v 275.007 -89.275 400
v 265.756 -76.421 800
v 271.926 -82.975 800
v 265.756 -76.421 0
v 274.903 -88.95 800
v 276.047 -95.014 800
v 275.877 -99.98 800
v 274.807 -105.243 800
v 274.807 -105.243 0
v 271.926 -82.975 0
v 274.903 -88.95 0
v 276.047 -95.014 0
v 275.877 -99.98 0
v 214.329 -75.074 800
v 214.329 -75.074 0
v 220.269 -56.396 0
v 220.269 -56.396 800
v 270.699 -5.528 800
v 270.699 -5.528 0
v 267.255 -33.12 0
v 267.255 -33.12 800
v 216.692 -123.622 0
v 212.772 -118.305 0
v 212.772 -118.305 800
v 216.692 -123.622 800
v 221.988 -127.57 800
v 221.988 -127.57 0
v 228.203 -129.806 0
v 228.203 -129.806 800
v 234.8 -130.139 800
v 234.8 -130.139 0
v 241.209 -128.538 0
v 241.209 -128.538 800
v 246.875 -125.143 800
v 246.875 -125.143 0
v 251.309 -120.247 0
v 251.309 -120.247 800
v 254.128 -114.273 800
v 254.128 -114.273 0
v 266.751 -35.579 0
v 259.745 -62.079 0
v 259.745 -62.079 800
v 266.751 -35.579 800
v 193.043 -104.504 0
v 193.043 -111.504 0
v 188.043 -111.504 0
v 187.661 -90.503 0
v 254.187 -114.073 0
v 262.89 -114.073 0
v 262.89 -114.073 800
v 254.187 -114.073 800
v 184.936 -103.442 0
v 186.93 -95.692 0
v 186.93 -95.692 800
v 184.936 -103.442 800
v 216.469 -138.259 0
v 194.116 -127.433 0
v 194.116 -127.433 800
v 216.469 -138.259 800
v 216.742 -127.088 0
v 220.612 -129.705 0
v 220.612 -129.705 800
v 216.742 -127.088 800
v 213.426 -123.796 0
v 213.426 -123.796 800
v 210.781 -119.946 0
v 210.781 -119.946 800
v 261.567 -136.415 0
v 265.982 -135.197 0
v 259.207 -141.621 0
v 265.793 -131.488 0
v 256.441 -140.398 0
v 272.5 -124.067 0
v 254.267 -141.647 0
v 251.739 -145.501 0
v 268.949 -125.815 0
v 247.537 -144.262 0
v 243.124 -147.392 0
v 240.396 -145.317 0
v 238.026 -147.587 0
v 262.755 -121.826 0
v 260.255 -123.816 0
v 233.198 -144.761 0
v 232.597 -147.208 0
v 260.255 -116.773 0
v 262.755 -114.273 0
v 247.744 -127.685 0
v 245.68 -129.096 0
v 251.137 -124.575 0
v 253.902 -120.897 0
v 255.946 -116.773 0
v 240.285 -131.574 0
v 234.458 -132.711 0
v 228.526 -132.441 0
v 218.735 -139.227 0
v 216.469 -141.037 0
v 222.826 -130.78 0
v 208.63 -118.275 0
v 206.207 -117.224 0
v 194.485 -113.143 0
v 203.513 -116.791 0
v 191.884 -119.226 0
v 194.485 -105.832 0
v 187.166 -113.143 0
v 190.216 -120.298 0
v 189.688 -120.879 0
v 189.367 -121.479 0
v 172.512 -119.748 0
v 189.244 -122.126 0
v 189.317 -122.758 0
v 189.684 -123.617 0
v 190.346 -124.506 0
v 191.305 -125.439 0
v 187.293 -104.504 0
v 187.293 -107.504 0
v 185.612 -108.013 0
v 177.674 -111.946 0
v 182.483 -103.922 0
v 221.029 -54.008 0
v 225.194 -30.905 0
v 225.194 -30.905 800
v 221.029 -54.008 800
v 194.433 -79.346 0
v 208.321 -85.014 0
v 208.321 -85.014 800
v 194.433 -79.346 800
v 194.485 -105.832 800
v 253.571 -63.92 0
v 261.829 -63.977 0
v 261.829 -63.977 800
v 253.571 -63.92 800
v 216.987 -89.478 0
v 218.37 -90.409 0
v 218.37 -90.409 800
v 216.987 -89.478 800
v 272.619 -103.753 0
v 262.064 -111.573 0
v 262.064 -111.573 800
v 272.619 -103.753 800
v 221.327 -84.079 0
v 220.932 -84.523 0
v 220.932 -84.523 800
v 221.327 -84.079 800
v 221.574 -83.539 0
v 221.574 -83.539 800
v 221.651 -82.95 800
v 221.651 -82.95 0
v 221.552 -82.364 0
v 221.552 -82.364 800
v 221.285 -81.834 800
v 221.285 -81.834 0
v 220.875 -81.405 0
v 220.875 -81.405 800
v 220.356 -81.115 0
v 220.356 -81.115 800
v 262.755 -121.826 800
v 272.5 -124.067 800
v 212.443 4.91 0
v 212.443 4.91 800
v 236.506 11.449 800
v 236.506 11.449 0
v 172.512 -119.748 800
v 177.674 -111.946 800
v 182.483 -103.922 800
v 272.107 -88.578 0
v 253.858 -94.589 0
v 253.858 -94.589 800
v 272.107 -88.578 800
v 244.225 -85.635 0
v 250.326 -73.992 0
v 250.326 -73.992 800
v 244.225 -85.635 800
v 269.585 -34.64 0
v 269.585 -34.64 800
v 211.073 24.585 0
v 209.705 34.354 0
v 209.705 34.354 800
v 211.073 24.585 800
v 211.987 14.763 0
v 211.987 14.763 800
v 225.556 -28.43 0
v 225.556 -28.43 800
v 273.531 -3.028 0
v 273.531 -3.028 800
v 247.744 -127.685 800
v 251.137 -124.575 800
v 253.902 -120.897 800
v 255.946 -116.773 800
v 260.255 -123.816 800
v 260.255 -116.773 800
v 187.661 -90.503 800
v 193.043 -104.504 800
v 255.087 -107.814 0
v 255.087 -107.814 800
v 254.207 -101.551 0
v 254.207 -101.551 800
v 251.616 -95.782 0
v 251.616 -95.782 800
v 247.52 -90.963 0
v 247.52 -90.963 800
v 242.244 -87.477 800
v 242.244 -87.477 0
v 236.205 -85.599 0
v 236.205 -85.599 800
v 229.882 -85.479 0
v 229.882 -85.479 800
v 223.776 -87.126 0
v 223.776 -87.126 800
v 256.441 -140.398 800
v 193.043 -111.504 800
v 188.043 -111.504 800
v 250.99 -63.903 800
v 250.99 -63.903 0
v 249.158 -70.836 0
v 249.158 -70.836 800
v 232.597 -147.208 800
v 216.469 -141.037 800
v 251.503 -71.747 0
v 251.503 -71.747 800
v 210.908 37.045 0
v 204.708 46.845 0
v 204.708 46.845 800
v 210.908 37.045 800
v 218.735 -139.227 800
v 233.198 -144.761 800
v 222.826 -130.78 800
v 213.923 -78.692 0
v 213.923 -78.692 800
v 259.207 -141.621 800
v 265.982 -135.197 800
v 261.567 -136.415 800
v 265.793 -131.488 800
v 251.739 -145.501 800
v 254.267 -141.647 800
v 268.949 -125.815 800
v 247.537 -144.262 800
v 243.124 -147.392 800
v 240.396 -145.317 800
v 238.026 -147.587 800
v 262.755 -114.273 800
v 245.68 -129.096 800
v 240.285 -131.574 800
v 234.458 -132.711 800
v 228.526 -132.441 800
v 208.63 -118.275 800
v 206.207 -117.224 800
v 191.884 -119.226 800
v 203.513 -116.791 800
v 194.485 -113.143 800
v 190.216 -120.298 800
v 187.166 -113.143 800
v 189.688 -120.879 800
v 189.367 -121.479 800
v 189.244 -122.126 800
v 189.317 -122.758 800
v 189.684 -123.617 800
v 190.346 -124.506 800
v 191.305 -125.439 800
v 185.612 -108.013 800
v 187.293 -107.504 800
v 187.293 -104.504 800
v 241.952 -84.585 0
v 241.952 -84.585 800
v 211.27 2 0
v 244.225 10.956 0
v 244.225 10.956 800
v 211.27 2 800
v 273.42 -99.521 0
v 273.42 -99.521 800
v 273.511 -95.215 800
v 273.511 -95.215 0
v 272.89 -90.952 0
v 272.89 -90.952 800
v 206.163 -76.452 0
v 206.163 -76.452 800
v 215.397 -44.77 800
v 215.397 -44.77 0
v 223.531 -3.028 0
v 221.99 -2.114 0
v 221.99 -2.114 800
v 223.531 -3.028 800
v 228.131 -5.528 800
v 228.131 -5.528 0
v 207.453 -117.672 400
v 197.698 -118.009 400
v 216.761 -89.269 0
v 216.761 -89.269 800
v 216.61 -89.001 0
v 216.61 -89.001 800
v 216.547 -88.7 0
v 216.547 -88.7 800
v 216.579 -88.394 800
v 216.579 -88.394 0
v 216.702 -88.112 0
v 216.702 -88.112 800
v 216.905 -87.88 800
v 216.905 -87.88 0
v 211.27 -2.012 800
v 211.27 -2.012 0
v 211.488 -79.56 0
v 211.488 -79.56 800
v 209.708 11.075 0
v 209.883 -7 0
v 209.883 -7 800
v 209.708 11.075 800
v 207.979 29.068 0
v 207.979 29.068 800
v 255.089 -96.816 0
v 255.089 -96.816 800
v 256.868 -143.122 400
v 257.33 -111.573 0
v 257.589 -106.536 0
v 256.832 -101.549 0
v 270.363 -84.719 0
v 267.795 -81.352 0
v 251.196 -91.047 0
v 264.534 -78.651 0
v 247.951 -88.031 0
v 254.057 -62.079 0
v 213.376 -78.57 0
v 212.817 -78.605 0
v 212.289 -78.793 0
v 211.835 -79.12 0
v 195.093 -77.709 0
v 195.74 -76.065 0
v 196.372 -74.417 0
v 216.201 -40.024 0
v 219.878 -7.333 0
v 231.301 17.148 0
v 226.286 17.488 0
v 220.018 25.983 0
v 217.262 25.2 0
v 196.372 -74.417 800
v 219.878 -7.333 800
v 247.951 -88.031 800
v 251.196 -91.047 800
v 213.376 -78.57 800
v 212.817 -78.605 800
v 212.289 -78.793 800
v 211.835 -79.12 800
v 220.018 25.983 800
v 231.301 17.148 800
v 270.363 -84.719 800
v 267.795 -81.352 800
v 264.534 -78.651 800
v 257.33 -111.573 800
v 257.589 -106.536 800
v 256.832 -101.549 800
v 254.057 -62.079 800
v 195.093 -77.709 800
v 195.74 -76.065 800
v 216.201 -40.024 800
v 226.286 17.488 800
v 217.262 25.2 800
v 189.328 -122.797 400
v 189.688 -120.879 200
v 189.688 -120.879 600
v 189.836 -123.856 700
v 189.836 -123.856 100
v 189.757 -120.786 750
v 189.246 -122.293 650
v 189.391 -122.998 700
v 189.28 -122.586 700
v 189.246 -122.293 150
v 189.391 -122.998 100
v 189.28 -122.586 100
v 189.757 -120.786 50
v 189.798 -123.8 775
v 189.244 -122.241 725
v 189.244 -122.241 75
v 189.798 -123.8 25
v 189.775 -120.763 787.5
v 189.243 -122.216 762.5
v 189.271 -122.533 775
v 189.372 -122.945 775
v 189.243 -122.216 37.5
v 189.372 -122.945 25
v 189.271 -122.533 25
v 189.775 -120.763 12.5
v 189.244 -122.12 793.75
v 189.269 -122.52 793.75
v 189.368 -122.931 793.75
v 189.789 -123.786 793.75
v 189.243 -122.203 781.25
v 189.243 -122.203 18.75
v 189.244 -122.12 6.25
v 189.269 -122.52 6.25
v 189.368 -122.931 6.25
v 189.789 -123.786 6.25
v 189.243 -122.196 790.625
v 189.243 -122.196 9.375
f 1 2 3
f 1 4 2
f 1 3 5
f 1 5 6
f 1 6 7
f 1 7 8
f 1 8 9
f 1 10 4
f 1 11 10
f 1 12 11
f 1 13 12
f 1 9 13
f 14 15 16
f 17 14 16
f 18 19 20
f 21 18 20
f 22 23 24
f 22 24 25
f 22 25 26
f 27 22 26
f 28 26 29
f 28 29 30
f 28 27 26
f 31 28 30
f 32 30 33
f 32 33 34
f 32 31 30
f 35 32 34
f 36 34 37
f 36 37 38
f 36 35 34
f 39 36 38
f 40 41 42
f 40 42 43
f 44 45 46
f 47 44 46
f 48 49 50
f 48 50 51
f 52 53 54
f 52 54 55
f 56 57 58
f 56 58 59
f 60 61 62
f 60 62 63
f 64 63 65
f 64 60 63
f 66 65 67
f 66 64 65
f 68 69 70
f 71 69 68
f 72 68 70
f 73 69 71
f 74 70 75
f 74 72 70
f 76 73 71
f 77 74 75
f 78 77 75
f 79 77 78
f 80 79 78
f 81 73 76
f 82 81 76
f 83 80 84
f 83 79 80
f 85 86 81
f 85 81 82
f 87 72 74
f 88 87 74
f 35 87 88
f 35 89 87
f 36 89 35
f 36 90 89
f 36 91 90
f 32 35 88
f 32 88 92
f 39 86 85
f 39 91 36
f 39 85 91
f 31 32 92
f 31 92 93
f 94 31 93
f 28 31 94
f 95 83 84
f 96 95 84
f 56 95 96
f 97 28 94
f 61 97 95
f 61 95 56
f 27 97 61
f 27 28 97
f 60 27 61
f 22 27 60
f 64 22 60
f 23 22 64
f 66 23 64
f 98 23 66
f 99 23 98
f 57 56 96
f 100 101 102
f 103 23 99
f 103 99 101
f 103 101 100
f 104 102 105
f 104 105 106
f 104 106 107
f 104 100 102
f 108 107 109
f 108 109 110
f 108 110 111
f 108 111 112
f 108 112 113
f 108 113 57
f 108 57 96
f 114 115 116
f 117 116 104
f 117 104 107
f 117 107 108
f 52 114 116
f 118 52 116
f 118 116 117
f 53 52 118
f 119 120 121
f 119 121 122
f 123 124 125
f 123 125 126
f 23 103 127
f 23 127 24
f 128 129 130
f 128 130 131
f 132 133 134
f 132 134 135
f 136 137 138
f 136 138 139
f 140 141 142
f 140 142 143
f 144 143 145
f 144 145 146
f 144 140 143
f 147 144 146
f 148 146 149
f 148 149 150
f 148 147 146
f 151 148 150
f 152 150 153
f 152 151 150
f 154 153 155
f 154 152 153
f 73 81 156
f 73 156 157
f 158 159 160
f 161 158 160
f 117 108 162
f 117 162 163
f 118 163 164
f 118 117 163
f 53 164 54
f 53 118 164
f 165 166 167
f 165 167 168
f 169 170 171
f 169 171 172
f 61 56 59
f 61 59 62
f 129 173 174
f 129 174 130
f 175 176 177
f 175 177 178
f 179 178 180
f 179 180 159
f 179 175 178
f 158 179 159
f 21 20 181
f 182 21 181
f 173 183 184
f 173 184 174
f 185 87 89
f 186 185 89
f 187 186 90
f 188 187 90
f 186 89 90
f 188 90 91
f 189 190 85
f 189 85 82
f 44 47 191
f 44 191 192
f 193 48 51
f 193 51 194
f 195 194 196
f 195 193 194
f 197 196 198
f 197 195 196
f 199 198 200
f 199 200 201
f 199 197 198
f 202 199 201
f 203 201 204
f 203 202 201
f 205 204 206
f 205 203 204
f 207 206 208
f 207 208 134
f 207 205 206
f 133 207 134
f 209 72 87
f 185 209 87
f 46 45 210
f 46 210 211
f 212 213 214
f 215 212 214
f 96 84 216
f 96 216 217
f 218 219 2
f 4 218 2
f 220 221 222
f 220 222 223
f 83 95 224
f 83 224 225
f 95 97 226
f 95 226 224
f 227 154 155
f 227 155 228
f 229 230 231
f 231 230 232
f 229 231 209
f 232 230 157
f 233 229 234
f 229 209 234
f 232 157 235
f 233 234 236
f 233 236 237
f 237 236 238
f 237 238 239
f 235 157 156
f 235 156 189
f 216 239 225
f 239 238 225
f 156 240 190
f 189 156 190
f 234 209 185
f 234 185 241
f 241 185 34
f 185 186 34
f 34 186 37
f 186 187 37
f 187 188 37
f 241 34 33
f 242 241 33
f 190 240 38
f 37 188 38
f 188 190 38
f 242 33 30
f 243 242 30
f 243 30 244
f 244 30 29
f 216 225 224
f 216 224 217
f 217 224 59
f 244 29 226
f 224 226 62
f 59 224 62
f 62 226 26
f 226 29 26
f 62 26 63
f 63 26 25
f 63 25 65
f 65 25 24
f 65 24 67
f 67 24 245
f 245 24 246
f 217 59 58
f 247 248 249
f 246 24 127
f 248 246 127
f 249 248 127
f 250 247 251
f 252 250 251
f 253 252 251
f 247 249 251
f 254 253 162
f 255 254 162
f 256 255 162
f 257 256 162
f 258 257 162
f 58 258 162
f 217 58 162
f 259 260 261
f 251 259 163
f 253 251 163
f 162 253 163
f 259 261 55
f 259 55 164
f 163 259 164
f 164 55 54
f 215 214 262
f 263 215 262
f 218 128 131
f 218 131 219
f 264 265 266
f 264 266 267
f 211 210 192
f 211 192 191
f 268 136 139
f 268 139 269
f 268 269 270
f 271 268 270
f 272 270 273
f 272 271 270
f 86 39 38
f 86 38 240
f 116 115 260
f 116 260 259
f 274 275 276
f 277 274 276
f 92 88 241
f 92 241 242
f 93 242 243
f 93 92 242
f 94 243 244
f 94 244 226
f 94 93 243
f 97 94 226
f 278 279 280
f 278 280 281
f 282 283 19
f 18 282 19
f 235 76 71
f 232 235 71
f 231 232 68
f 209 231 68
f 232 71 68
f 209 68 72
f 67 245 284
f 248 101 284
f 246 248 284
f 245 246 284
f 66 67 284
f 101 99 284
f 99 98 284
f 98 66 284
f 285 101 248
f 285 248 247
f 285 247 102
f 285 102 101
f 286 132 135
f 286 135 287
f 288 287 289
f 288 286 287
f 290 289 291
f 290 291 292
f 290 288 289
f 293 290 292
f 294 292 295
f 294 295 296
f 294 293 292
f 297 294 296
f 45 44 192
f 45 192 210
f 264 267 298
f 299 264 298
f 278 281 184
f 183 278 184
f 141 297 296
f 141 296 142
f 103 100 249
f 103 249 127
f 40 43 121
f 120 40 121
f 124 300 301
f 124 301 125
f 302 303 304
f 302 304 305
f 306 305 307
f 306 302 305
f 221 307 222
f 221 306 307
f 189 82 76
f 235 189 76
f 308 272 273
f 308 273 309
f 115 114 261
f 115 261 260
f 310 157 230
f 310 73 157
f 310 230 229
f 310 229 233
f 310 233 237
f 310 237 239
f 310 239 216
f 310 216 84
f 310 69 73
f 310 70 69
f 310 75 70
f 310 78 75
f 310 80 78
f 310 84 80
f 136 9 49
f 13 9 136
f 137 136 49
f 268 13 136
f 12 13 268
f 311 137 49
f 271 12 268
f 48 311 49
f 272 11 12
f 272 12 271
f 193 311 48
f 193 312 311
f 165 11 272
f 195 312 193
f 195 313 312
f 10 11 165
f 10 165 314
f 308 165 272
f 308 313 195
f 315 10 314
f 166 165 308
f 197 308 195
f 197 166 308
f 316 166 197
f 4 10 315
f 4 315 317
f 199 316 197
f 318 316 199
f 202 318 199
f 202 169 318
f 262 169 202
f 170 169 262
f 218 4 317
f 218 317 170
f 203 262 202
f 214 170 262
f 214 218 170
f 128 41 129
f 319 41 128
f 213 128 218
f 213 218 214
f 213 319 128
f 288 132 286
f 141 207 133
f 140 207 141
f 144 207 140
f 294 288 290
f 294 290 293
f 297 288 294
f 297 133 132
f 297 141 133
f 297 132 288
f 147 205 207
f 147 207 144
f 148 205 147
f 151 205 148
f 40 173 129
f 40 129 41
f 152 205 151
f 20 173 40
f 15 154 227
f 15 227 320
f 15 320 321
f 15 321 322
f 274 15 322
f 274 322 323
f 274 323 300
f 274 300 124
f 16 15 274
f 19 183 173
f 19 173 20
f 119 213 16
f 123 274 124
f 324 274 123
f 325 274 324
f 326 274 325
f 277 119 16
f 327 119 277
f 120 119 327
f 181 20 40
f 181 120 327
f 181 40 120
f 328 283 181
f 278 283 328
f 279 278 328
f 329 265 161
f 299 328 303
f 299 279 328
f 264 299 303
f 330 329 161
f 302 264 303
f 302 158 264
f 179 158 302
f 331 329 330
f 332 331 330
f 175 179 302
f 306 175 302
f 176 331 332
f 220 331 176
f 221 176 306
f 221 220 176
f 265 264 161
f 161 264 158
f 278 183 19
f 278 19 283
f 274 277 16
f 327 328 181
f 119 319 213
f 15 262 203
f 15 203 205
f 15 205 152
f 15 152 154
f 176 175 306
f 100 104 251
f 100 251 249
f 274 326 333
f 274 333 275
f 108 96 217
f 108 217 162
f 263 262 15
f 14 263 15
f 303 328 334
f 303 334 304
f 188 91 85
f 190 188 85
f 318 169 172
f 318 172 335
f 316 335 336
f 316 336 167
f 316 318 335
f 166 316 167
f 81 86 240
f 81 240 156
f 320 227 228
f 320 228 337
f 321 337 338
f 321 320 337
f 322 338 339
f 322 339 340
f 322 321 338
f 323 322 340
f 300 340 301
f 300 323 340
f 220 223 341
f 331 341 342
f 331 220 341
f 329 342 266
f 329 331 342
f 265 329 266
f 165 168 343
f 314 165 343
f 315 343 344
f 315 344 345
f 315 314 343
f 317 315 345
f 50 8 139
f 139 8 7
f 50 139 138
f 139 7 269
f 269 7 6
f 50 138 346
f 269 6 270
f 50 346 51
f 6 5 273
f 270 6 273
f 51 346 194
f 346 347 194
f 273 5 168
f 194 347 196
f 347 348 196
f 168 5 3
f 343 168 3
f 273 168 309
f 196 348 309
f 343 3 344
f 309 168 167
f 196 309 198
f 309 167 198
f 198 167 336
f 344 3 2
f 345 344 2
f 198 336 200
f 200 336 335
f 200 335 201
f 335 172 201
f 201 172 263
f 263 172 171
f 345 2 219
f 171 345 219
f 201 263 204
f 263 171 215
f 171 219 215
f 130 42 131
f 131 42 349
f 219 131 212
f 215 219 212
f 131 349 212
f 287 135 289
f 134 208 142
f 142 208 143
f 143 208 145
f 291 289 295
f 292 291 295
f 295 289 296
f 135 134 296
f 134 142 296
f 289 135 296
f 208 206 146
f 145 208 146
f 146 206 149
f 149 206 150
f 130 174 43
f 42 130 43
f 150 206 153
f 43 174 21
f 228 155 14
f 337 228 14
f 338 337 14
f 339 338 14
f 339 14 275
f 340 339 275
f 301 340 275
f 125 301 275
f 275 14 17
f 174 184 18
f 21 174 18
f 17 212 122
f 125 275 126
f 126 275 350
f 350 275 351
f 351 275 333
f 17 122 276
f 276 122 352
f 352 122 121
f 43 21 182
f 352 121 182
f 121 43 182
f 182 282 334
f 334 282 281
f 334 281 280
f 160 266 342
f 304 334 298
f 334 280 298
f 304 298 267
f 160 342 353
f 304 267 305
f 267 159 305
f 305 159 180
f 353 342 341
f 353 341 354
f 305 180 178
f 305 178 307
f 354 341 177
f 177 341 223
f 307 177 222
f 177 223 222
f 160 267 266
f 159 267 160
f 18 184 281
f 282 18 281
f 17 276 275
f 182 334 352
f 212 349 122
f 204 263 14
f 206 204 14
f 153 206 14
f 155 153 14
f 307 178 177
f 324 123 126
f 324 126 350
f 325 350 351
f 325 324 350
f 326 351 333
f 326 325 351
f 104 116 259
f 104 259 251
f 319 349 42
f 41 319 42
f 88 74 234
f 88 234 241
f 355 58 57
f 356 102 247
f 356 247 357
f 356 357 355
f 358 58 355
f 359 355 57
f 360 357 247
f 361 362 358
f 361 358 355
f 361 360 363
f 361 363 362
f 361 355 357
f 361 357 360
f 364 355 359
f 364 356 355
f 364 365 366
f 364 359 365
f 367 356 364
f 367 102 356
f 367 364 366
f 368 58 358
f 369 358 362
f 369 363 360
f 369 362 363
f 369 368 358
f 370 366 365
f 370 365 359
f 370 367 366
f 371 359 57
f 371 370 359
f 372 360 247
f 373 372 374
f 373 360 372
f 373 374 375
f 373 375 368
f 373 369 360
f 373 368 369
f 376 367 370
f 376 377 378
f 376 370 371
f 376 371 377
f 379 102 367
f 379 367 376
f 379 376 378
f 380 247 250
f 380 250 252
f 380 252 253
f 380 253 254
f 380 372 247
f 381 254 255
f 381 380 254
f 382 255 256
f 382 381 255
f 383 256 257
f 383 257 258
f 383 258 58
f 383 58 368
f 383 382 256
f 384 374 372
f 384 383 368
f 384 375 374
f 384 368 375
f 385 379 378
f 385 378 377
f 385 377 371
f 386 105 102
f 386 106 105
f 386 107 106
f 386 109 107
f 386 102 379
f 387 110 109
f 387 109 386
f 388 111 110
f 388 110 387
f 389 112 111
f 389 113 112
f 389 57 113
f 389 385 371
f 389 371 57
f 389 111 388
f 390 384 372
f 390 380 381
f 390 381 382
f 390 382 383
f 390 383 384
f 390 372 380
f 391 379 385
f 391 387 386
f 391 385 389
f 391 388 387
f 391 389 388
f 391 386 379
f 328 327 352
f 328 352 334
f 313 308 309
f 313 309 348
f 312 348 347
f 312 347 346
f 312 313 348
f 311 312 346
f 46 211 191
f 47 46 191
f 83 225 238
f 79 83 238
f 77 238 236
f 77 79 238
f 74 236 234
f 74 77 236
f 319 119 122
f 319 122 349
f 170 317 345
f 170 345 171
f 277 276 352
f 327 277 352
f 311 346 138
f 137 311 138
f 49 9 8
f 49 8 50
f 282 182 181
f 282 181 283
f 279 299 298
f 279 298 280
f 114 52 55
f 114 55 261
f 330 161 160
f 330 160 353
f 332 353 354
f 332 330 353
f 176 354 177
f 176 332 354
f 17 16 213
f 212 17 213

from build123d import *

# Parameters (mm, degrees)
BOSS_EXTRUDE1_DEPTH   = 800
BOSS_EXTRUDE1_2_DEPTH = 800
BOSS_EXTRUDE1_3_DEPTH = 800


with BuildPart() as part:
    # Sketch2 → Boss-Extrude1 (new body)
    with BuildSketch(Plane.XY):
        with BuildLine():
            Line((219.877743808, -7.333333333), (209.883300908, -7))
            ThreePointArc((209.883300908, -7), (209.036823939, 20.089953644), (204.708380722, 46.845265098))
            Line((204.708380722, 46.845265098), (210.908263166, 37.044972147))
            ThreePointArc((210.908263166, 37.044972147), (225.418988897, 21.257964998), (244.224799112, 10.95591384))
            Line((244.224799112, 10.95591384), (211.269993414, 2))
            Line((211.269993414, 2), (211.269993414, -2.012186433))
            Line((211.269993414, -2.012186433), (221.990475975, -2.114290898))
            Line((221.990475975, -2.114290898), (223.530977705, -3.027795155))
            Line((223.530977705, -3.027795155), (273.530977705, -3.027795155))
            Line((273.530977705, -3.027795155), (269.584815864, -34.639562765))
            Line((269.584815864, -34.639562765), (261.828573121, -63.977474169))
            Line((261.828573121, -63.977474169), (253.570603739, -63.920369552))
            Line((253.570603739, -63.920369552), (251.502867564, -71.746815931))
            Line((251.502867564, -71.746815931), (265.756145816, -76.42057877))
            add(Edge.make_bspline(
                [(265.756145816, -76.42057877), (279.732844517, -87.718519491), (274.80699177, -105.243303822)],
                knots=[0, 0, 0, 1, 1, 1], degree=2))
            Line((274.80699177, -105.243303822), (262.889701897, -114.073205773))
            Line((262.889701897, -114.073205773), (254.187014796, -114.073467609))
            ThreePointArc((254.187014796, -114.073467609), (245.005362752, -89.033401072), (218.370489992, -90.408617244))
            Line((218.370489992, -90.408617244), (216.987423166, -89.47817055))
            ThreePointArc((216.987423166, -89.47817055), (216.546928458, -88.6998252), (216.905234712, -87.880390212))
            Line((216.905234712, -87.880390212), (220.932114628, -84.522977972))
            ThreePointArc((220.932114628, -84.522977972), (221.623404057, -82.653573805), (220.356188922, -81.115159421))
            Line((220.356188922, -81.115159421), (213.922645584, -78.692485674))
            ThreePointArc((213.922645584, -78.692485674), (212.546582543, -78.680182493), (211.48830239, -79.559809676))
            Line((211.48830239, -79.559809676), (208.320966691, -85.013968481))
            Line((208.320966691, -85.013968481), (194.432902245, -79.346370583))
            ThreePointArc((194.432902245, -79.346370583), (195.418239612, -76.887655881), (196.372486568, -74.416708601))
            Line((196.372486568, -74.416708601), (206.163211734, -76.451825484))
            Line((206.163211734, -76.451825484), (215.396541258, -44.769744406))
            Line((215.396541258, -44.769744406), (216.201262108, -40.024272027))
            Line((216.201262108, -40.024272027), (219.877743808, -7.333333333))
        make_face()
        Polygon((270.699494071, -5.527795155), (267.255142009, -33.119683511), (225.555597681, -28.430077836), (228.131229539, -5.527795155), align=None, mode=Mode.SUBTRACT)
        Polygon((221.028914069, -54.008130098), (254.057209492, -62.078551489), (259.744710015, -62.078551489), (266.75063601, -35.578705754), (225.193651001, -30.905132557), align=None, mode=Mode.SUBTRACT)
        with BuildLine():
            Line((250.326268176, -73.991973356), (244.224799112, -85.63464351))
            ThreePointArc((244.224799112, -85.63464351), (249.640856314, -89.46696755), (253.858108107, -94.588995513))
            Line((253.858108107, -94.588995513), (272.107313629, -88.577563806))
            ThreePointArc((272.107313629, -88.577563806), (269.17492176, -82.962253968), (264.533682358, -78.650697003))
            Line((264.533682358, -78.650697003), (250.326268176, -73.991973356))
        make_face(mode=Mode.SUBTRACT)
        with BuildLine():
            Line((262.06445628, -111.573205773), (272.619054804, -103.75296551))
            ThreePointArc((272.619054804, -103.75296551), (273.555215096, -97.369625677), (272.889612093, -90.952430327))
            Line((272.889612093, -90.952430327), (255.088866515, -96.816322326))
            ThreePointArc((255.088866515, -96.816322326), (257.336724857, -104.023661365), (257.33049641, -111.573400722))
            Line((257.33049641, -111.573400722), (262.06445628, -111.573205773))
        make_face(mode=Mode.SUBTRACT)
        with BuildLine():
            Line((212.443278327, 4.909530906), (236.506394493, 11.449007942))
            ThreePointArc((236.506394493, 11.449007942), (221.606630296, 21.147833274), (209.704620684, 34.354360188))
            ThreePointArc((209.704620684, 34.354360188), (211.586770977, 19.679642969), (212.443278327, 4.909530906))
        make_face(mode=Mode.SUBTRACT)
        Polygon((249.157757395, -70.835874948), (241.952280674, -84.585184811), (214.328828436, -75.073832175), (220.269405707, -56.396096127), (250.989539733, -63.902521257), align=None, mode=Mode.SUBTRACT)
    extrude(amount=BOSS_EXTRUDE1_DEPTH)


with BuildPart() as body_2:
    # Sketch2 → Boss-Extrude1 2 (new body)
    with BuildSketch(Plane.XY):
        with BuildLine():
            Line((216.469459271, -141.037184205), (172.512257161, -119.747739558))
            ThreePointArc((172.512257161, -119.747739558), (180.123356683, -107.960994704), (186.930410904, -95.692327171))
            Line((186.930410904, -95.692327171), (184.936120706, -103.441553939))
            Line((184.936120706, -103.441553939), (187.292803793, -104.504288635))
            Line((187.292803793, -104.504288635), (187.292803793, -107.504288635))
            Line((187.292803793, -107.504288635), (185.612345377, -108.013264922))
            Line((185.612345377, -108.013264922), (187.166078479, -113.14313822))
            Line((187.166078479, -113.14313822), (194.485119153, -113.14313822))
            Line((194.485119153, -113.14313822), (194.485119153, -105.831804929))
            Line((194.485119153, -105.831804929), (212.772463132, -118.30531603))
            ThreePointArc((212.772463132, -118.30531603), (234.800277303, -130.138906076), (254.127625184, -114.273469605))
            Line((254.127625184, -114.273469605), (262.754736754, -114.273469605))
            Line((262.754736754, -114.273469605), (262.754736754, -121.826061943))
            Line((262.754736754, -121.826061943), (272.500467307, -124.066761831))
            add(Edge.make_bspline(
                [(272.500467307, -124.066761831), (261.187460089, -150.606305517), (232.597385362, -147.208325233)],
                knots=[0, 0, 0, 1, 1, 1], degree=2))
            Line((232.597385362, -147.208325233), (216.469459271, -141.037184205))
        make_face()
        with BuildLine():
            Line((256.441296727, -140.398444944), (247.744082063, -127.68467095))
            ThreePointArc((247.744082063, -127.68467095), (252.604105384, -122.799651864), (255.945892041, -116.77340095))
            Line((255.945892041, -116.77340095), (260.254736754, -116.773400241))
            Line((260.254736754, -116.773400241), (260.254736754, -123.81649767))
            Line((260.254736754, -123.81649767), (268.948965772, -125.815440477))
            ThreePointArc((268.948965772, -125.815440477), (263.803722581, -134.057768277), (256.441296727, -140.398444944))
        make_face(mode=Mode.SUBTRACT)
        with BuildLine():
            Line((218.734928689, -139.227271917), (233.197636825, -144.761238965))
            ThreePointArc((233.197636825, -144.761238965), (243.996021225, -144.989518192), (254.26668504, -141.647261193))
            Line((254.26668504, -141.647261193), (245.680415042, -129.095558837))
            ThreePointArc((245.680415042, -129.095558837), (234.457663773, -132.710529956), (222.826219463, -130.779813637))
            Line((222.826219463, -130.779813637), (218.734928689, -139.227271917))
        make_face(mode=Mode.SUBTRACT)
        with BuildLine():
            Line((194.115962412, -127.433113779), (216.468781859, -138.259078342))
            Line((216.468781859, -138.259078342), (220.611641642, -129.705139796))
            ThreePointArc((220.611641642, -129.705139796), (215.006853725, -125.519847458), (210.780992799, -119.945583472))
            add(Edge.make_bspline(
                [(203.512673415, -116.791372692), (207.758261172, -116.975234714), (210.780992799, -119.945583472)],
                knots=[0, 0, 0, 1, 1, 1], degree=2))
            add(Edge.make_bspline(
                [(203.512673415, -116.791372692), (197.698228021, -118.008638917), (191.883782627, -119.225905142)],
                knots=[0.316118576, 0.316118576, 0.316118576, 1, 1, 1], degree=2))
            add(Edge.make_bspline(
                [(191.883782627, -119.225905142), (185.65547594, -122.26514873), (194.115962412, -127.433113779)],
                knots=[0, 0, 0, 1, 1, 1], degree=2))
        make_face(mode=Mode.SUBTRACT)
    extrude(amount=BOSS_EXTRUDE1_2_DEPTH)


with BuildPart() as body_3:
    # Sketch2 → Boss-Extrude1 3 (new body)
    with BuildSketch(Plane.XY):
        Polygon((188.043162181, -111.504288635), (187.661207371, -90.503054317), (193.043162181, -104.504288635), (193.043162181, -111.504288635), align=None)
    extrude(amount=BOSS_EXTRUDE1_3_DEPTH)


solid = Compound([part.part, body_2.part, body_3.part])
